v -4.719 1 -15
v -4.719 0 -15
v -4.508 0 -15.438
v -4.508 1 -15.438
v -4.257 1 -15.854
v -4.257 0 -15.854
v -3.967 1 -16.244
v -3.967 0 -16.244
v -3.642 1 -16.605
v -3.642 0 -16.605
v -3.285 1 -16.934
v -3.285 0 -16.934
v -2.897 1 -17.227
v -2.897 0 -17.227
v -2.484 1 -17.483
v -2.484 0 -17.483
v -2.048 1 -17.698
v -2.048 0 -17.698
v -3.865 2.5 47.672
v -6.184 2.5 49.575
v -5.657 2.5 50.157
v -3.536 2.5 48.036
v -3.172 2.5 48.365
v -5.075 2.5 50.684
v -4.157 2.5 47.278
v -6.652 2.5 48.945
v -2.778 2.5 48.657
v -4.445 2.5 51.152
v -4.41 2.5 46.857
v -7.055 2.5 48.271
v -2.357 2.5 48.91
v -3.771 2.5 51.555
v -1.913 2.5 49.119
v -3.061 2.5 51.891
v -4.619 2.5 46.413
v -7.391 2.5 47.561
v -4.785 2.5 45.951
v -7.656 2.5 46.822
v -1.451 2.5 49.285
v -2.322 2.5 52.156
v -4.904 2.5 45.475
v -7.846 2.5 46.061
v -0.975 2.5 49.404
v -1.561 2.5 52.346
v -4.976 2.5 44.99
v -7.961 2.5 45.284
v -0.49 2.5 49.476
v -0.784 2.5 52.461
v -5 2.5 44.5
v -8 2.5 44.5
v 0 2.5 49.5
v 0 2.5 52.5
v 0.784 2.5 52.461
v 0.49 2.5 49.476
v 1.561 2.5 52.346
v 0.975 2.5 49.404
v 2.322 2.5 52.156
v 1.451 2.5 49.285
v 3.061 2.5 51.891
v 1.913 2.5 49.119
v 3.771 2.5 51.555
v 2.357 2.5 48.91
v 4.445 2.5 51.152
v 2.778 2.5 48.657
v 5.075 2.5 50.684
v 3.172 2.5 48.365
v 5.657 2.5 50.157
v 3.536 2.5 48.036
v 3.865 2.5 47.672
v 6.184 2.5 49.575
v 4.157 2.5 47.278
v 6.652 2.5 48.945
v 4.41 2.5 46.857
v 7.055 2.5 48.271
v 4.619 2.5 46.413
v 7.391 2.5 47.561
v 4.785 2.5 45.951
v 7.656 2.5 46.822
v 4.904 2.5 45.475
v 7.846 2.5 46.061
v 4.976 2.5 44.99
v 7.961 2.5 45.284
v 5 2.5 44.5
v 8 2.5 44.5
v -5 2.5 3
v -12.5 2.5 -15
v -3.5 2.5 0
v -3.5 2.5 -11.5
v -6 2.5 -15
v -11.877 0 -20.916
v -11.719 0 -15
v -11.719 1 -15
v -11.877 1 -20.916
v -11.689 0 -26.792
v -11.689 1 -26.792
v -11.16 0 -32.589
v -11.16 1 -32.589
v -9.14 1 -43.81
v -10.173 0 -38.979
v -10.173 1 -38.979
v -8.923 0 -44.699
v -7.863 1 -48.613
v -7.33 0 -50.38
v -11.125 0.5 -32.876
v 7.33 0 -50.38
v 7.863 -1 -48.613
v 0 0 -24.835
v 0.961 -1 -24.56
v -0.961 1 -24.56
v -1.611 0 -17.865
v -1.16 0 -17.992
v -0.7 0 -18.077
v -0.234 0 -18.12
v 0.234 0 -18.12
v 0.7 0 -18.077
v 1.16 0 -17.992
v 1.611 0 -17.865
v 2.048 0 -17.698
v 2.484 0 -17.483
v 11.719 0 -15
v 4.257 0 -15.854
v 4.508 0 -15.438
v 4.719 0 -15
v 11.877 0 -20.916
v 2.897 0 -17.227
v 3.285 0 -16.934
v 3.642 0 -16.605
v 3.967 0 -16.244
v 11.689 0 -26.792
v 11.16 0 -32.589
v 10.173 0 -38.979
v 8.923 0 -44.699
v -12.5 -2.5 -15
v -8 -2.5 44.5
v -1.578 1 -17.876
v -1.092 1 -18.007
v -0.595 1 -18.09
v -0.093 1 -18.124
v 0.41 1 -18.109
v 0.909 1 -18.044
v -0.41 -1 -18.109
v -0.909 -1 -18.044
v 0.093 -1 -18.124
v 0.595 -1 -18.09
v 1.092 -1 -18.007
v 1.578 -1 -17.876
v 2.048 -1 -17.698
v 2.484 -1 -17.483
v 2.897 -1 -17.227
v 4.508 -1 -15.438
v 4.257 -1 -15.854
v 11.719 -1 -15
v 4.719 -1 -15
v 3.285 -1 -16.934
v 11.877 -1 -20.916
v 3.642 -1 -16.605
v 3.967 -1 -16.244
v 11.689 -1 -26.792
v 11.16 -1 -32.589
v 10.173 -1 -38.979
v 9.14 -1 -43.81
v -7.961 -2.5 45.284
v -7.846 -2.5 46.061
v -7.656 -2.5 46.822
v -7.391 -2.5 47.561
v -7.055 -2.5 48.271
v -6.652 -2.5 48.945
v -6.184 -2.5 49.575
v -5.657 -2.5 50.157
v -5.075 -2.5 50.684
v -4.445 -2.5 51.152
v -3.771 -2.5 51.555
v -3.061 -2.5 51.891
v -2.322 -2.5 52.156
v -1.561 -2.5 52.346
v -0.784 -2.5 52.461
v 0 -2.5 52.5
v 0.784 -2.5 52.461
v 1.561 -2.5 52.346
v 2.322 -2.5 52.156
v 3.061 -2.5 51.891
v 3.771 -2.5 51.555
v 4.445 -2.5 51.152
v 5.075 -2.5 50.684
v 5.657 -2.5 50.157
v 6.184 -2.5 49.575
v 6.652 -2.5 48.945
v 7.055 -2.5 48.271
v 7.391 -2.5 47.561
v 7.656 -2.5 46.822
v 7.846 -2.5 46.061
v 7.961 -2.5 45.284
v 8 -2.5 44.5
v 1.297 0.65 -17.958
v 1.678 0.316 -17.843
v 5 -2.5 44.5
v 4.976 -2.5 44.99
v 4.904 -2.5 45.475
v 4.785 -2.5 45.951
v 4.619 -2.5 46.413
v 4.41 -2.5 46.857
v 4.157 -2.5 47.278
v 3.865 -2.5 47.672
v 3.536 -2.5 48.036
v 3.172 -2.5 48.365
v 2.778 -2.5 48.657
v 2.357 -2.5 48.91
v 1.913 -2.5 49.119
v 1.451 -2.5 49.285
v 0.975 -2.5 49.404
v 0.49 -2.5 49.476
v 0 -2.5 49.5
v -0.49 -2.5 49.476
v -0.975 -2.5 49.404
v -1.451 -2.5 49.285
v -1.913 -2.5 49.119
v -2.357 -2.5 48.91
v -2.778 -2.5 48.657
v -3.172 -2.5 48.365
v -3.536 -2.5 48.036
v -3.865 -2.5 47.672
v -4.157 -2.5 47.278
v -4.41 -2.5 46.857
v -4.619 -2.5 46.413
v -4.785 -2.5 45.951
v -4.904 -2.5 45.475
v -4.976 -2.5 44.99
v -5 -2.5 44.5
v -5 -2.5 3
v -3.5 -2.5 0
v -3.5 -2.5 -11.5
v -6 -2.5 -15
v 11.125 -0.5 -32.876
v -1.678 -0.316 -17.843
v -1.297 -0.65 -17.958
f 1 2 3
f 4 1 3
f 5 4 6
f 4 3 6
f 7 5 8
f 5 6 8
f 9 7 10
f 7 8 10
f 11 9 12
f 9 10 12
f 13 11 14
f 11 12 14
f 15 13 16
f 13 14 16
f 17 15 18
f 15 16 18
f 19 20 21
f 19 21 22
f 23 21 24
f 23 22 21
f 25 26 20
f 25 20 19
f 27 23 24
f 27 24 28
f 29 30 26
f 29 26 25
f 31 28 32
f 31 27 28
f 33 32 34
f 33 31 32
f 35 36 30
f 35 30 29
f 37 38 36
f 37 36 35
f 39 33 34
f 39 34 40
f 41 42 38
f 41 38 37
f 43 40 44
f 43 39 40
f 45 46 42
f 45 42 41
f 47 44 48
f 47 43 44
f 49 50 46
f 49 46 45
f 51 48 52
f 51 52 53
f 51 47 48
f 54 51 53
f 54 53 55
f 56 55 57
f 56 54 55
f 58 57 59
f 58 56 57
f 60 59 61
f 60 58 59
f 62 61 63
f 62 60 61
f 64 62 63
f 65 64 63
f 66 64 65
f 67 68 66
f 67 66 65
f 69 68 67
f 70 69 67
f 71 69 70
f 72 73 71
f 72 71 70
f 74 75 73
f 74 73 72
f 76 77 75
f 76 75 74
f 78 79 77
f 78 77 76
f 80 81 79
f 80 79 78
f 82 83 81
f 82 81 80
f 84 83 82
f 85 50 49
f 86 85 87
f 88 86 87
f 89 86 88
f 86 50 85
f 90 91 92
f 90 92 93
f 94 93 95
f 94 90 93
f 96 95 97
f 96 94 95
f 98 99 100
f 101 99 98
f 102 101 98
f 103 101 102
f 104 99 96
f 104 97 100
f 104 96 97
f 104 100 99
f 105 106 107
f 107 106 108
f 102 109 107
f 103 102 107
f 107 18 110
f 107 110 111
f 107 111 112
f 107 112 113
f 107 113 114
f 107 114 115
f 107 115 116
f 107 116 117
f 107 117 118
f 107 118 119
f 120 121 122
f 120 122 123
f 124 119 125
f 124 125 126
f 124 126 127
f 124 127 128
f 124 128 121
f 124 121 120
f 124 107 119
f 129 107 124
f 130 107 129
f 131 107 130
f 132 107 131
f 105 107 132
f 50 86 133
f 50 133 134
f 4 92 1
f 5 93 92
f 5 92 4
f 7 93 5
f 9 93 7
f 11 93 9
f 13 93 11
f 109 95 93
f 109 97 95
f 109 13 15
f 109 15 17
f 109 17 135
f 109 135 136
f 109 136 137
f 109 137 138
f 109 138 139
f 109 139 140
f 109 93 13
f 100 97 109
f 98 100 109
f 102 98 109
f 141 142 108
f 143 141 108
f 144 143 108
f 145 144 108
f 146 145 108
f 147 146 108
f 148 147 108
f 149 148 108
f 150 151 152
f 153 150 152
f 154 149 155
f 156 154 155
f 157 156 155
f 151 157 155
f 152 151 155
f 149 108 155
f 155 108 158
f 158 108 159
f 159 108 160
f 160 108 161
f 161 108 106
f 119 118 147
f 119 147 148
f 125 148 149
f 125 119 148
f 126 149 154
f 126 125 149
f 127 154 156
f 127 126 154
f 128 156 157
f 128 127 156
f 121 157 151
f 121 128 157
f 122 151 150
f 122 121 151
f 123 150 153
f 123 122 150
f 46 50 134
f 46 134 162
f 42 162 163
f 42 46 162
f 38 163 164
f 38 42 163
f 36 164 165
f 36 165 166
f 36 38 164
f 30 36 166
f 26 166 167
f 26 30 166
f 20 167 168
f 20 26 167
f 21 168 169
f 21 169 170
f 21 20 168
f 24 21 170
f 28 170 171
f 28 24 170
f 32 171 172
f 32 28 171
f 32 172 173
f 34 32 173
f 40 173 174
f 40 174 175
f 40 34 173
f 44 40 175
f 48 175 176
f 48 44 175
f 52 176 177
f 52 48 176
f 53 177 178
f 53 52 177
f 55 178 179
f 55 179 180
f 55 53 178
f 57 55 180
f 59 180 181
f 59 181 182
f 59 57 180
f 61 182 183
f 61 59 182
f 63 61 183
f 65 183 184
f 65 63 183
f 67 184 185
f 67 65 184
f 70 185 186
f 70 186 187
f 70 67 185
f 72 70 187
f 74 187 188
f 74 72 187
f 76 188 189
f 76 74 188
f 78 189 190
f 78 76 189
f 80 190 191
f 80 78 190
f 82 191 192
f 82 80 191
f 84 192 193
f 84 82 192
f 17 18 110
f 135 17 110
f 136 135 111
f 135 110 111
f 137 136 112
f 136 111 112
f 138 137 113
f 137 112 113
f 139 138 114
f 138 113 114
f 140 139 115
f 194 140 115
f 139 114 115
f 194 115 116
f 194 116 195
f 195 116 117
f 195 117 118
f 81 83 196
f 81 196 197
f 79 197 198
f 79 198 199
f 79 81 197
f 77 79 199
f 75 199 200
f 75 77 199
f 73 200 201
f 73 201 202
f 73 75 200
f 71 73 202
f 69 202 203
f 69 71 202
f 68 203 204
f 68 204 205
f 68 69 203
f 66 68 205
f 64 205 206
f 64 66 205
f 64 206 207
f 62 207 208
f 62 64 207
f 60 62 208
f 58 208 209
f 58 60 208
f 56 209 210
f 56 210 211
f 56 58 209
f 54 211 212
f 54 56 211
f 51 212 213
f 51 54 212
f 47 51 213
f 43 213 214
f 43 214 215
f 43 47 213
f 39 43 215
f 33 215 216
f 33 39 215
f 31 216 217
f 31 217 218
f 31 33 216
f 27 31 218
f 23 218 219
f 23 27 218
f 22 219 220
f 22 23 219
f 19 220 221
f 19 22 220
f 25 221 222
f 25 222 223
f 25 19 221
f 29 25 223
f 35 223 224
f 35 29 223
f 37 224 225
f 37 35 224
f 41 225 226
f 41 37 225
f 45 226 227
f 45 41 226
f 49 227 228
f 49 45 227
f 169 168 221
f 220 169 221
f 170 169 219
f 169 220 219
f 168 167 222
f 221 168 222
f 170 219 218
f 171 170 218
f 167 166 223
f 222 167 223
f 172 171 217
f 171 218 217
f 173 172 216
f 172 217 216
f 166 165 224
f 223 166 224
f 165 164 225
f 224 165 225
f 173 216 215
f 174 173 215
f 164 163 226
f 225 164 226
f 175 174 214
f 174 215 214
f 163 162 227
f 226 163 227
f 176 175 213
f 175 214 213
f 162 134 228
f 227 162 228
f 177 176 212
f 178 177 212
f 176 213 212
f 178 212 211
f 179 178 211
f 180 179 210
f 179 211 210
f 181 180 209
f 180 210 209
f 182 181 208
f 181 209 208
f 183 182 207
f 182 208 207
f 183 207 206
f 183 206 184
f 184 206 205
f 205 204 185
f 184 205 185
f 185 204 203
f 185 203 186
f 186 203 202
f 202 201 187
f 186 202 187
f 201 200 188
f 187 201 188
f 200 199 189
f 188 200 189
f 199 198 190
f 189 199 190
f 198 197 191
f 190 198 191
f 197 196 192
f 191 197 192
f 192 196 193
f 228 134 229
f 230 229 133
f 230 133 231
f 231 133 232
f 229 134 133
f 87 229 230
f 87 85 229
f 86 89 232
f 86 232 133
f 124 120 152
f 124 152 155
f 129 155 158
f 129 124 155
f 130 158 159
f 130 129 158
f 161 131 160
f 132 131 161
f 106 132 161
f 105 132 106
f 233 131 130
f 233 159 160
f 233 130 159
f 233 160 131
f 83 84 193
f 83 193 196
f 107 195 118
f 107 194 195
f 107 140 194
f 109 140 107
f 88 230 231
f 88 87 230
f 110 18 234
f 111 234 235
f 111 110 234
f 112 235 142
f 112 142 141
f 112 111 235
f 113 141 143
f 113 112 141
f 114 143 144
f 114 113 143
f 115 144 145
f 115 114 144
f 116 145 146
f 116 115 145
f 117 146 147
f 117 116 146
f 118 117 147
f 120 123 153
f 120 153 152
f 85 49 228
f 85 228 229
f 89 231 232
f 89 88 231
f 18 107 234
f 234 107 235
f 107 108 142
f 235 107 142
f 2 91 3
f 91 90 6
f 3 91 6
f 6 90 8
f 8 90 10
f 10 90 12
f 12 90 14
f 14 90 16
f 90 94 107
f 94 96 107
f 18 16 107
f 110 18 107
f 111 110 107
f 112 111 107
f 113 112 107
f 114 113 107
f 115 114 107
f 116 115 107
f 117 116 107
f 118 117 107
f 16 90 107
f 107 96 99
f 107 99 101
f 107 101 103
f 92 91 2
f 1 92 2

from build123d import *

# Parameters (mm, degrees)
BOSS_EXTRUDE1_DEPTH = 2.5
BOSS_EXTRUDE2_DEPTH = 1
BOSS_EXTRUDE3_DEPTH = 1
CHAMFER1_SIZE       = 1
CHAMFER2_SIZE       = 1


with BuildPart() as part:
    # Sketch1 → Boss-Extrude1 (new, symmetric)
    with BuildSketch(Plane(origin=(0, 0, 0), x_dir=(1, 0, 0), z_dir=(0, 1, 0))):
        with BuildLine():
            Line((-3.5, 11.5), (-6, 15))
            Line((-6, 15), (-12.5, 15))
            Line((-12.5, 15), (-8, -44.5))
            ThreePointArc((-8, -44.5), (-7.211102551, -41.035898385), (-5, -38.255002002))
            Line((-5, -38.255002002), (-5, -3))
            Line((-5, -3), (-3.5, 0))
            Line((-3.5, 0), (-3.5, 11.5))
        make_face()
        with BuildLine():
            Line((-5, -44.5), (-5, -38.255002002))
            ThreePointArc((-5, -38.255002002), (-7.211102551, -41.035898385), (-8, -44.5))
            ThreePointArc((-8, -44.5), (-5.656854249, -50.156854249), (0, -52.5))
            Line((0, -52.5), (0, -49.5))
            ThreePointArc((0, -49.5), (-3.535533906, -48.035533906), (-5, -44.5))
        make_face()
        with BuildLine():
            ThreePointArc((5, -44.5), (3.535533906, -48.035533906), (0, -49.5))
            Line((0, -49.5), (0, -52.5))
            ThreePointArc((0, -52.5), (5.656854249, -50.156854249), (8, -44.5))
            Line((8, -44.5), (5, -44.5))
        make_face()
    extrude(amount=BOSS_EXTRUDE1_DEPTH, both=True)


with BuildPart() as body_2:
    # Sketch3 → Boss-Extrude2 (new body)
    with BuildSketch(Plane(origin=(0, 0, 0), x_dir=(1, 0, 0), z_dir=(0, 1, 0))):
        with BuildLine():
            Line((0, 24.83548282), (-7.330228596, 50.379681687))
            add(Edge.make_bspline(
                [(-11.71864214, 15), (-12.72517251, 33.061648889), (-7.330228596, 50.379681687)],
                knots=[0, 0, 0, 1, 1, 1], degree=2))
            Line((-11.71864214, 15), (-4.71864214, 15))
            ThreePointArc((-4.71864214, 15), (-3.642426936, 16.605316859), (-2.048214886, 17.69791437))
            Line((-2.048214886, 17.69791437), (0, 24.83548282))
        make_face()
        with BuildLine():
            Line((2.048214886, 17.69791437), (0, 24.83548282))
            Line((0, 24.83548282), (-2.048214886, 17.69791437))
            ThreePointArc((-2.048214886, 17.69791437), (0, 18.124995965), (2.048214886, 17.69791437))
        make_face()
    extrude(amount=BOSS_EXTRUDE2_DEPTH)

    # Chamfer1
    chamfer1_edges = [body_2.edges().sort_by_distance(p)[0] for p in [
        (-2.641006855, 1, -34.038798028),
    ]]
    chamfer(chamfer1_edges, length=CHAMFER1_SIZE - 0.0001)  # a hair under: the kernel refuses the full size


with BuildPart() as body_3:
    # Sketch3<3> → Boss-Extrude3 (new body)
    with BuildSketch(Plane(origin=(0, 0, 0), x_dir=(1, 0, 0), z_dir=(0, 1, 0))):
        with BuildLine():
            Line((7.330228596, 50.379681687), (0, 24.83548282))
            Line((0, 24.83548282), (2.048214886, 17.69791437))
            ThreePointArc((2.048214886, 17.69791437), (3.642426936, 16.605316859), (4.71864214, 15))
            Line((4.71864214, 15), (11.71864214, 15))
            add(Edge.make_bspline(
                [(11.71864214, 15), (12.72517251, 33.061648889), (7.330228596, 50.379681687)],
                knots=[0, 0, 0, 1, 1, 1], degree=2))
        make_face()
        with BuildLine():
            Line((2.048214886, 17.69791437), (0, 24.83548282))
            Line((0, 24.83548282), (-2.048214886, 17.69791437))
            ThreePointArc((-2.048214886, 17.69791437), (0, 18.124995965), (2.048214886, 17.69791437))
        make_face()
    extrude(amount=-BOSS_EXTRUDE3_DEPTH)

    # Chamfer2
    chamfer2_edges = [body_3.edges().sort_by_distance(p)[0] for p in [
        (2.641006855, -1, -34.038798028),
    ]]
    chamfer(chamfer2_edges, length=CHAMFER2_SIZE - 0.0001)  # a hair under: the kernel refuses the full size


solid = Compound([part.part, body_2.part, body_3.part])
